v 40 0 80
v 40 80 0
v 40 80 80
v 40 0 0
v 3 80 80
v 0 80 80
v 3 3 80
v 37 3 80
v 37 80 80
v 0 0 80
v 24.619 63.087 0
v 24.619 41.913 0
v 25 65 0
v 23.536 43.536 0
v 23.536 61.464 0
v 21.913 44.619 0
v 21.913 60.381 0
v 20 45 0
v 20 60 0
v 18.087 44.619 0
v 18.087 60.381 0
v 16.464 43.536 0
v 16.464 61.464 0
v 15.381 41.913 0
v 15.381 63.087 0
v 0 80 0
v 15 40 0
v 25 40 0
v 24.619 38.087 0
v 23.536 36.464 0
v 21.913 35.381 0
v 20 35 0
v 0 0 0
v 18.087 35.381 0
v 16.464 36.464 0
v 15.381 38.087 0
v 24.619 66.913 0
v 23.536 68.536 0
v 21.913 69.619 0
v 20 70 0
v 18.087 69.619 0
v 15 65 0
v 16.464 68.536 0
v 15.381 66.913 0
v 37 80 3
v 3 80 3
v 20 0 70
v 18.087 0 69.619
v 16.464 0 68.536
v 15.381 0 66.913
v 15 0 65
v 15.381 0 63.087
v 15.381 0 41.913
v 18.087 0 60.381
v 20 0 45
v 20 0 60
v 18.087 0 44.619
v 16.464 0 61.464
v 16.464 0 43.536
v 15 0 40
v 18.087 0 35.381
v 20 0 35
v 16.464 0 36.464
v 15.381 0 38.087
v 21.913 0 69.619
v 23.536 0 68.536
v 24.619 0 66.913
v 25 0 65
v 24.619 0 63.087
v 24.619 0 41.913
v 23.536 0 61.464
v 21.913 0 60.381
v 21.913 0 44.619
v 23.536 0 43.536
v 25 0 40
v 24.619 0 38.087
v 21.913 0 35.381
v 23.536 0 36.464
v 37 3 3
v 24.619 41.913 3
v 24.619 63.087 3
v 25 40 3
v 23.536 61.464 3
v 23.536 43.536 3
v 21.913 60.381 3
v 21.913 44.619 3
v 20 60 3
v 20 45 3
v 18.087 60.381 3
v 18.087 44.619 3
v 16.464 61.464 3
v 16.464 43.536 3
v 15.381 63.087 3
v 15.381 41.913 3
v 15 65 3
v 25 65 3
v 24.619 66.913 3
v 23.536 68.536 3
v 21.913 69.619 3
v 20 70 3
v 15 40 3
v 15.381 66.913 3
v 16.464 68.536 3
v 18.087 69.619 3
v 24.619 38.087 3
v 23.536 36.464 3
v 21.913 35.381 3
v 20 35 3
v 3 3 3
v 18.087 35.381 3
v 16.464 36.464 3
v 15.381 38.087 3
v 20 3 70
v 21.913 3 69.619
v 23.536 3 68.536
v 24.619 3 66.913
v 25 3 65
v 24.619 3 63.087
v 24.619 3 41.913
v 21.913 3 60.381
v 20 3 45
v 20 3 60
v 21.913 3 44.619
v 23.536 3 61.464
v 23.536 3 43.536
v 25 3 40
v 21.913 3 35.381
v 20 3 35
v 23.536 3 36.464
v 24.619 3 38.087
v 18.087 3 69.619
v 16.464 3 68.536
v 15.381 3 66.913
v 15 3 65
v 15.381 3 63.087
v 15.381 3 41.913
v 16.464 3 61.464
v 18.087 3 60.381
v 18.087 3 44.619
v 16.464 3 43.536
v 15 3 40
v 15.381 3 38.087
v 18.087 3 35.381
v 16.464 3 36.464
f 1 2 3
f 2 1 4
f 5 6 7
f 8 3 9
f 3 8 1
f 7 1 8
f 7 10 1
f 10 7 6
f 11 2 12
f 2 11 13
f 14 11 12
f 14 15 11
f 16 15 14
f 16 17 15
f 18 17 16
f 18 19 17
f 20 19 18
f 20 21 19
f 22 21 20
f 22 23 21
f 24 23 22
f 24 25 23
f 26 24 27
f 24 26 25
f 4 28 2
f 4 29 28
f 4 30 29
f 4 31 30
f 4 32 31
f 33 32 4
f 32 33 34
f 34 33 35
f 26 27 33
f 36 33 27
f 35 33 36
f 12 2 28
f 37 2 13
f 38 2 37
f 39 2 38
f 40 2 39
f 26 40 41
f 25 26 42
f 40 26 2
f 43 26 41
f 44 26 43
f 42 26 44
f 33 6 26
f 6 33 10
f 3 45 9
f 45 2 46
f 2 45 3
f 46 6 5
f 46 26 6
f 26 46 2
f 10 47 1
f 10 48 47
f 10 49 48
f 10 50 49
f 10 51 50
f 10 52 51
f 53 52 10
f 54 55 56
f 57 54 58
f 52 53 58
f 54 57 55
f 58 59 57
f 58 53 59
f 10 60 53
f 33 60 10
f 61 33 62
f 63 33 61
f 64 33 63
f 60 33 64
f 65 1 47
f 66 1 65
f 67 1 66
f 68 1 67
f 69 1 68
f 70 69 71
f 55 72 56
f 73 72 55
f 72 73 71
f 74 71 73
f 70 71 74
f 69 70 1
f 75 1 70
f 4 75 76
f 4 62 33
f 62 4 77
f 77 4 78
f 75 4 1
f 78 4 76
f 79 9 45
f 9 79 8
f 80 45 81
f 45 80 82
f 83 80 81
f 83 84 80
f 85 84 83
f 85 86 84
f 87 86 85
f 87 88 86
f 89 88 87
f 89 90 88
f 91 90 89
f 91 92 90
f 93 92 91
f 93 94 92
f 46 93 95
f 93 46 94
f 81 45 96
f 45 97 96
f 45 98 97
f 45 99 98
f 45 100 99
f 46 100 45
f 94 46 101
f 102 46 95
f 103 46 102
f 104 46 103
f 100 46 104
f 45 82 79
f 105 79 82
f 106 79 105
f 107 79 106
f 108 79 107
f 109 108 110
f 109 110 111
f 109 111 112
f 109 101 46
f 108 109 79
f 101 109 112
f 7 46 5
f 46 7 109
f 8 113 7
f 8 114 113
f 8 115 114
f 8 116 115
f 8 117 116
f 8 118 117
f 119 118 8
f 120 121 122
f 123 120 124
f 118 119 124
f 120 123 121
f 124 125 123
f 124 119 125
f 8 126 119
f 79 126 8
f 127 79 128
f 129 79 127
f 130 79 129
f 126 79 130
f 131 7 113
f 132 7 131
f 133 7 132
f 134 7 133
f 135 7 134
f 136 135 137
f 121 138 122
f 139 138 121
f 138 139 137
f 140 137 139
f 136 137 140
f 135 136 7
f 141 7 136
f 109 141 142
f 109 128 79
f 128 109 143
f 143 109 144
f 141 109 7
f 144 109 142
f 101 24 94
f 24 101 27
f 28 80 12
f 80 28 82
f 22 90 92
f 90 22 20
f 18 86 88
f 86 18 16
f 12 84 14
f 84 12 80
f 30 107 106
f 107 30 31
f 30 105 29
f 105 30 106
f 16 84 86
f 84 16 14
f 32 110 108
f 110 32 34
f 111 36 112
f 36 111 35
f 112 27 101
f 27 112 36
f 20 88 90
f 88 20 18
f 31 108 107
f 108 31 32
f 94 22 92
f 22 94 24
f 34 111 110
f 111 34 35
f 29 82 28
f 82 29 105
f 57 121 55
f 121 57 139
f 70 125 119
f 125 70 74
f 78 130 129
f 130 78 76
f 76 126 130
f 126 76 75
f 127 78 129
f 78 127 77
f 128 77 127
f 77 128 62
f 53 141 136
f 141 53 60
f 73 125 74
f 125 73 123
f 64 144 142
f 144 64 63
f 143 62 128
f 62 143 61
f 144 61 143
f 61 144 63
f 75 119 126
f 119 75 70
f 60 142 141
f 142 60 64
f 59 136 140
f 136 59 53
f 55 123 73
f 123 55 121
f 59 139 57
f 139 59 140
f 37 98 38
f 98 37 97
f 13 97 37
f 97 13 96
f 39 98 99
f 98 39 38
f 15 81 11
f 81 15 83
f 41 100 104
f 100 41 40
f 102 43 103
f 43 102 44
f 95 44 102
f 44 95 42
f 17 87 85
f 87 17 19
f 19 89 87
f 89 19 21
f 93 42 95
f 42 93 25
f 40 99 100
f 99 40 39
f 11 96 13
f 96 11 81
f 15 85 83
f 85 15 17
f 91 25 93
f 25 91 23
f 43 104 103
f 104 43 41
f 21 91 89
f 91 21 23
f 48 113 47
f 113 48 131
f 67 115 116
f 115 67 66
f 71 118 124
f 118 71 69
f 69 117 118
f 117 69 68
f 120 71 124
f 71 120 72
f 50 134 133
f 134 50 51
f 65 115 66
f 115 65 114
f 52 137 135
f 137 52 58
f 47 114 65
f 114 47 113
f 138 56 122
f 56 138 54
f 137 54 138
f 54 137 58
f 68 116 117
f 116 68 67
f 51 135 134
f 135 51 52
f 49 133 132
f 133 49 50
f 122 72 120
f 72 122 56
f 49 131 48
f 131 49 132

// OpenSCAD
// F-Roof: A multi-function single-layer roof
// https://github.com/f-roof
// Author: Mihai Oltean; https://mihaioltean.github.io
//------------------------------------------------------------------------------------
// LAST UPDATE: 2025.04.08.0
//------------------------------------------------------------------------------------
module corner_60()
{
    difference(){
        cube([40, 60, 60]);
        translate([3, 3, 3])
            cube([34, 60, 60]);
            // holes
        translate([20, 40, -1])
            cylinder(h = 5, r = 4);
        translate([20, -1, 40])
            rotate([-90, 0, 0])
                cylinder(h = 5, r = 4);
    }
}
//-------------------------------------------------------------
module corner_80()
{
    difference(){
        cube([40, 80, 80]);
        translate([3, 3, 3])
            cube([34, 80, 80]);
            // holes
        translate([20, 40, -1])
            cylinder(h = 5, r = 5);
        translate([20, -1, 40])
            rotate([-90, 0, 0])
                cylinder(h = 5, r = 5);
        translate([20, 65, -1])
            cylinder(h = 5, r = 5);
        translate([20, -1, 65])
            rotate([-90, 0, 0])
                cylinder(h = 5, r = 5);
    }
}
//-------------------------------------------------------------
module corner_80_half_angle(angle)
{
    tmp_length = 80 / tan(angle);
    difference(){
        cube([40, tmp_length, 80]);
        rotate([angle, 0, 0]) translate([-1, 0, 0]) cube([42, 110, 80]);
        translate([3, 3, 3])
            cube([34, tmp_length, 80]);
            // hole
        translate([20, 40, -1])
            cylinder(h = 5, r = 4);
    }
}
//-------------------------------------------------------------
module corner_80_angle(angle)
{
    corner_80_half_angle(52);
    rotate([-2*(90-angle), 0, 0 ])
        mirror([0,1,0])
            corner_80_half_angle(52);
}
//-------------------------------------------------------------
corner_80();
//corner_80_angle(52);
//corner_80_half_angle(52);
